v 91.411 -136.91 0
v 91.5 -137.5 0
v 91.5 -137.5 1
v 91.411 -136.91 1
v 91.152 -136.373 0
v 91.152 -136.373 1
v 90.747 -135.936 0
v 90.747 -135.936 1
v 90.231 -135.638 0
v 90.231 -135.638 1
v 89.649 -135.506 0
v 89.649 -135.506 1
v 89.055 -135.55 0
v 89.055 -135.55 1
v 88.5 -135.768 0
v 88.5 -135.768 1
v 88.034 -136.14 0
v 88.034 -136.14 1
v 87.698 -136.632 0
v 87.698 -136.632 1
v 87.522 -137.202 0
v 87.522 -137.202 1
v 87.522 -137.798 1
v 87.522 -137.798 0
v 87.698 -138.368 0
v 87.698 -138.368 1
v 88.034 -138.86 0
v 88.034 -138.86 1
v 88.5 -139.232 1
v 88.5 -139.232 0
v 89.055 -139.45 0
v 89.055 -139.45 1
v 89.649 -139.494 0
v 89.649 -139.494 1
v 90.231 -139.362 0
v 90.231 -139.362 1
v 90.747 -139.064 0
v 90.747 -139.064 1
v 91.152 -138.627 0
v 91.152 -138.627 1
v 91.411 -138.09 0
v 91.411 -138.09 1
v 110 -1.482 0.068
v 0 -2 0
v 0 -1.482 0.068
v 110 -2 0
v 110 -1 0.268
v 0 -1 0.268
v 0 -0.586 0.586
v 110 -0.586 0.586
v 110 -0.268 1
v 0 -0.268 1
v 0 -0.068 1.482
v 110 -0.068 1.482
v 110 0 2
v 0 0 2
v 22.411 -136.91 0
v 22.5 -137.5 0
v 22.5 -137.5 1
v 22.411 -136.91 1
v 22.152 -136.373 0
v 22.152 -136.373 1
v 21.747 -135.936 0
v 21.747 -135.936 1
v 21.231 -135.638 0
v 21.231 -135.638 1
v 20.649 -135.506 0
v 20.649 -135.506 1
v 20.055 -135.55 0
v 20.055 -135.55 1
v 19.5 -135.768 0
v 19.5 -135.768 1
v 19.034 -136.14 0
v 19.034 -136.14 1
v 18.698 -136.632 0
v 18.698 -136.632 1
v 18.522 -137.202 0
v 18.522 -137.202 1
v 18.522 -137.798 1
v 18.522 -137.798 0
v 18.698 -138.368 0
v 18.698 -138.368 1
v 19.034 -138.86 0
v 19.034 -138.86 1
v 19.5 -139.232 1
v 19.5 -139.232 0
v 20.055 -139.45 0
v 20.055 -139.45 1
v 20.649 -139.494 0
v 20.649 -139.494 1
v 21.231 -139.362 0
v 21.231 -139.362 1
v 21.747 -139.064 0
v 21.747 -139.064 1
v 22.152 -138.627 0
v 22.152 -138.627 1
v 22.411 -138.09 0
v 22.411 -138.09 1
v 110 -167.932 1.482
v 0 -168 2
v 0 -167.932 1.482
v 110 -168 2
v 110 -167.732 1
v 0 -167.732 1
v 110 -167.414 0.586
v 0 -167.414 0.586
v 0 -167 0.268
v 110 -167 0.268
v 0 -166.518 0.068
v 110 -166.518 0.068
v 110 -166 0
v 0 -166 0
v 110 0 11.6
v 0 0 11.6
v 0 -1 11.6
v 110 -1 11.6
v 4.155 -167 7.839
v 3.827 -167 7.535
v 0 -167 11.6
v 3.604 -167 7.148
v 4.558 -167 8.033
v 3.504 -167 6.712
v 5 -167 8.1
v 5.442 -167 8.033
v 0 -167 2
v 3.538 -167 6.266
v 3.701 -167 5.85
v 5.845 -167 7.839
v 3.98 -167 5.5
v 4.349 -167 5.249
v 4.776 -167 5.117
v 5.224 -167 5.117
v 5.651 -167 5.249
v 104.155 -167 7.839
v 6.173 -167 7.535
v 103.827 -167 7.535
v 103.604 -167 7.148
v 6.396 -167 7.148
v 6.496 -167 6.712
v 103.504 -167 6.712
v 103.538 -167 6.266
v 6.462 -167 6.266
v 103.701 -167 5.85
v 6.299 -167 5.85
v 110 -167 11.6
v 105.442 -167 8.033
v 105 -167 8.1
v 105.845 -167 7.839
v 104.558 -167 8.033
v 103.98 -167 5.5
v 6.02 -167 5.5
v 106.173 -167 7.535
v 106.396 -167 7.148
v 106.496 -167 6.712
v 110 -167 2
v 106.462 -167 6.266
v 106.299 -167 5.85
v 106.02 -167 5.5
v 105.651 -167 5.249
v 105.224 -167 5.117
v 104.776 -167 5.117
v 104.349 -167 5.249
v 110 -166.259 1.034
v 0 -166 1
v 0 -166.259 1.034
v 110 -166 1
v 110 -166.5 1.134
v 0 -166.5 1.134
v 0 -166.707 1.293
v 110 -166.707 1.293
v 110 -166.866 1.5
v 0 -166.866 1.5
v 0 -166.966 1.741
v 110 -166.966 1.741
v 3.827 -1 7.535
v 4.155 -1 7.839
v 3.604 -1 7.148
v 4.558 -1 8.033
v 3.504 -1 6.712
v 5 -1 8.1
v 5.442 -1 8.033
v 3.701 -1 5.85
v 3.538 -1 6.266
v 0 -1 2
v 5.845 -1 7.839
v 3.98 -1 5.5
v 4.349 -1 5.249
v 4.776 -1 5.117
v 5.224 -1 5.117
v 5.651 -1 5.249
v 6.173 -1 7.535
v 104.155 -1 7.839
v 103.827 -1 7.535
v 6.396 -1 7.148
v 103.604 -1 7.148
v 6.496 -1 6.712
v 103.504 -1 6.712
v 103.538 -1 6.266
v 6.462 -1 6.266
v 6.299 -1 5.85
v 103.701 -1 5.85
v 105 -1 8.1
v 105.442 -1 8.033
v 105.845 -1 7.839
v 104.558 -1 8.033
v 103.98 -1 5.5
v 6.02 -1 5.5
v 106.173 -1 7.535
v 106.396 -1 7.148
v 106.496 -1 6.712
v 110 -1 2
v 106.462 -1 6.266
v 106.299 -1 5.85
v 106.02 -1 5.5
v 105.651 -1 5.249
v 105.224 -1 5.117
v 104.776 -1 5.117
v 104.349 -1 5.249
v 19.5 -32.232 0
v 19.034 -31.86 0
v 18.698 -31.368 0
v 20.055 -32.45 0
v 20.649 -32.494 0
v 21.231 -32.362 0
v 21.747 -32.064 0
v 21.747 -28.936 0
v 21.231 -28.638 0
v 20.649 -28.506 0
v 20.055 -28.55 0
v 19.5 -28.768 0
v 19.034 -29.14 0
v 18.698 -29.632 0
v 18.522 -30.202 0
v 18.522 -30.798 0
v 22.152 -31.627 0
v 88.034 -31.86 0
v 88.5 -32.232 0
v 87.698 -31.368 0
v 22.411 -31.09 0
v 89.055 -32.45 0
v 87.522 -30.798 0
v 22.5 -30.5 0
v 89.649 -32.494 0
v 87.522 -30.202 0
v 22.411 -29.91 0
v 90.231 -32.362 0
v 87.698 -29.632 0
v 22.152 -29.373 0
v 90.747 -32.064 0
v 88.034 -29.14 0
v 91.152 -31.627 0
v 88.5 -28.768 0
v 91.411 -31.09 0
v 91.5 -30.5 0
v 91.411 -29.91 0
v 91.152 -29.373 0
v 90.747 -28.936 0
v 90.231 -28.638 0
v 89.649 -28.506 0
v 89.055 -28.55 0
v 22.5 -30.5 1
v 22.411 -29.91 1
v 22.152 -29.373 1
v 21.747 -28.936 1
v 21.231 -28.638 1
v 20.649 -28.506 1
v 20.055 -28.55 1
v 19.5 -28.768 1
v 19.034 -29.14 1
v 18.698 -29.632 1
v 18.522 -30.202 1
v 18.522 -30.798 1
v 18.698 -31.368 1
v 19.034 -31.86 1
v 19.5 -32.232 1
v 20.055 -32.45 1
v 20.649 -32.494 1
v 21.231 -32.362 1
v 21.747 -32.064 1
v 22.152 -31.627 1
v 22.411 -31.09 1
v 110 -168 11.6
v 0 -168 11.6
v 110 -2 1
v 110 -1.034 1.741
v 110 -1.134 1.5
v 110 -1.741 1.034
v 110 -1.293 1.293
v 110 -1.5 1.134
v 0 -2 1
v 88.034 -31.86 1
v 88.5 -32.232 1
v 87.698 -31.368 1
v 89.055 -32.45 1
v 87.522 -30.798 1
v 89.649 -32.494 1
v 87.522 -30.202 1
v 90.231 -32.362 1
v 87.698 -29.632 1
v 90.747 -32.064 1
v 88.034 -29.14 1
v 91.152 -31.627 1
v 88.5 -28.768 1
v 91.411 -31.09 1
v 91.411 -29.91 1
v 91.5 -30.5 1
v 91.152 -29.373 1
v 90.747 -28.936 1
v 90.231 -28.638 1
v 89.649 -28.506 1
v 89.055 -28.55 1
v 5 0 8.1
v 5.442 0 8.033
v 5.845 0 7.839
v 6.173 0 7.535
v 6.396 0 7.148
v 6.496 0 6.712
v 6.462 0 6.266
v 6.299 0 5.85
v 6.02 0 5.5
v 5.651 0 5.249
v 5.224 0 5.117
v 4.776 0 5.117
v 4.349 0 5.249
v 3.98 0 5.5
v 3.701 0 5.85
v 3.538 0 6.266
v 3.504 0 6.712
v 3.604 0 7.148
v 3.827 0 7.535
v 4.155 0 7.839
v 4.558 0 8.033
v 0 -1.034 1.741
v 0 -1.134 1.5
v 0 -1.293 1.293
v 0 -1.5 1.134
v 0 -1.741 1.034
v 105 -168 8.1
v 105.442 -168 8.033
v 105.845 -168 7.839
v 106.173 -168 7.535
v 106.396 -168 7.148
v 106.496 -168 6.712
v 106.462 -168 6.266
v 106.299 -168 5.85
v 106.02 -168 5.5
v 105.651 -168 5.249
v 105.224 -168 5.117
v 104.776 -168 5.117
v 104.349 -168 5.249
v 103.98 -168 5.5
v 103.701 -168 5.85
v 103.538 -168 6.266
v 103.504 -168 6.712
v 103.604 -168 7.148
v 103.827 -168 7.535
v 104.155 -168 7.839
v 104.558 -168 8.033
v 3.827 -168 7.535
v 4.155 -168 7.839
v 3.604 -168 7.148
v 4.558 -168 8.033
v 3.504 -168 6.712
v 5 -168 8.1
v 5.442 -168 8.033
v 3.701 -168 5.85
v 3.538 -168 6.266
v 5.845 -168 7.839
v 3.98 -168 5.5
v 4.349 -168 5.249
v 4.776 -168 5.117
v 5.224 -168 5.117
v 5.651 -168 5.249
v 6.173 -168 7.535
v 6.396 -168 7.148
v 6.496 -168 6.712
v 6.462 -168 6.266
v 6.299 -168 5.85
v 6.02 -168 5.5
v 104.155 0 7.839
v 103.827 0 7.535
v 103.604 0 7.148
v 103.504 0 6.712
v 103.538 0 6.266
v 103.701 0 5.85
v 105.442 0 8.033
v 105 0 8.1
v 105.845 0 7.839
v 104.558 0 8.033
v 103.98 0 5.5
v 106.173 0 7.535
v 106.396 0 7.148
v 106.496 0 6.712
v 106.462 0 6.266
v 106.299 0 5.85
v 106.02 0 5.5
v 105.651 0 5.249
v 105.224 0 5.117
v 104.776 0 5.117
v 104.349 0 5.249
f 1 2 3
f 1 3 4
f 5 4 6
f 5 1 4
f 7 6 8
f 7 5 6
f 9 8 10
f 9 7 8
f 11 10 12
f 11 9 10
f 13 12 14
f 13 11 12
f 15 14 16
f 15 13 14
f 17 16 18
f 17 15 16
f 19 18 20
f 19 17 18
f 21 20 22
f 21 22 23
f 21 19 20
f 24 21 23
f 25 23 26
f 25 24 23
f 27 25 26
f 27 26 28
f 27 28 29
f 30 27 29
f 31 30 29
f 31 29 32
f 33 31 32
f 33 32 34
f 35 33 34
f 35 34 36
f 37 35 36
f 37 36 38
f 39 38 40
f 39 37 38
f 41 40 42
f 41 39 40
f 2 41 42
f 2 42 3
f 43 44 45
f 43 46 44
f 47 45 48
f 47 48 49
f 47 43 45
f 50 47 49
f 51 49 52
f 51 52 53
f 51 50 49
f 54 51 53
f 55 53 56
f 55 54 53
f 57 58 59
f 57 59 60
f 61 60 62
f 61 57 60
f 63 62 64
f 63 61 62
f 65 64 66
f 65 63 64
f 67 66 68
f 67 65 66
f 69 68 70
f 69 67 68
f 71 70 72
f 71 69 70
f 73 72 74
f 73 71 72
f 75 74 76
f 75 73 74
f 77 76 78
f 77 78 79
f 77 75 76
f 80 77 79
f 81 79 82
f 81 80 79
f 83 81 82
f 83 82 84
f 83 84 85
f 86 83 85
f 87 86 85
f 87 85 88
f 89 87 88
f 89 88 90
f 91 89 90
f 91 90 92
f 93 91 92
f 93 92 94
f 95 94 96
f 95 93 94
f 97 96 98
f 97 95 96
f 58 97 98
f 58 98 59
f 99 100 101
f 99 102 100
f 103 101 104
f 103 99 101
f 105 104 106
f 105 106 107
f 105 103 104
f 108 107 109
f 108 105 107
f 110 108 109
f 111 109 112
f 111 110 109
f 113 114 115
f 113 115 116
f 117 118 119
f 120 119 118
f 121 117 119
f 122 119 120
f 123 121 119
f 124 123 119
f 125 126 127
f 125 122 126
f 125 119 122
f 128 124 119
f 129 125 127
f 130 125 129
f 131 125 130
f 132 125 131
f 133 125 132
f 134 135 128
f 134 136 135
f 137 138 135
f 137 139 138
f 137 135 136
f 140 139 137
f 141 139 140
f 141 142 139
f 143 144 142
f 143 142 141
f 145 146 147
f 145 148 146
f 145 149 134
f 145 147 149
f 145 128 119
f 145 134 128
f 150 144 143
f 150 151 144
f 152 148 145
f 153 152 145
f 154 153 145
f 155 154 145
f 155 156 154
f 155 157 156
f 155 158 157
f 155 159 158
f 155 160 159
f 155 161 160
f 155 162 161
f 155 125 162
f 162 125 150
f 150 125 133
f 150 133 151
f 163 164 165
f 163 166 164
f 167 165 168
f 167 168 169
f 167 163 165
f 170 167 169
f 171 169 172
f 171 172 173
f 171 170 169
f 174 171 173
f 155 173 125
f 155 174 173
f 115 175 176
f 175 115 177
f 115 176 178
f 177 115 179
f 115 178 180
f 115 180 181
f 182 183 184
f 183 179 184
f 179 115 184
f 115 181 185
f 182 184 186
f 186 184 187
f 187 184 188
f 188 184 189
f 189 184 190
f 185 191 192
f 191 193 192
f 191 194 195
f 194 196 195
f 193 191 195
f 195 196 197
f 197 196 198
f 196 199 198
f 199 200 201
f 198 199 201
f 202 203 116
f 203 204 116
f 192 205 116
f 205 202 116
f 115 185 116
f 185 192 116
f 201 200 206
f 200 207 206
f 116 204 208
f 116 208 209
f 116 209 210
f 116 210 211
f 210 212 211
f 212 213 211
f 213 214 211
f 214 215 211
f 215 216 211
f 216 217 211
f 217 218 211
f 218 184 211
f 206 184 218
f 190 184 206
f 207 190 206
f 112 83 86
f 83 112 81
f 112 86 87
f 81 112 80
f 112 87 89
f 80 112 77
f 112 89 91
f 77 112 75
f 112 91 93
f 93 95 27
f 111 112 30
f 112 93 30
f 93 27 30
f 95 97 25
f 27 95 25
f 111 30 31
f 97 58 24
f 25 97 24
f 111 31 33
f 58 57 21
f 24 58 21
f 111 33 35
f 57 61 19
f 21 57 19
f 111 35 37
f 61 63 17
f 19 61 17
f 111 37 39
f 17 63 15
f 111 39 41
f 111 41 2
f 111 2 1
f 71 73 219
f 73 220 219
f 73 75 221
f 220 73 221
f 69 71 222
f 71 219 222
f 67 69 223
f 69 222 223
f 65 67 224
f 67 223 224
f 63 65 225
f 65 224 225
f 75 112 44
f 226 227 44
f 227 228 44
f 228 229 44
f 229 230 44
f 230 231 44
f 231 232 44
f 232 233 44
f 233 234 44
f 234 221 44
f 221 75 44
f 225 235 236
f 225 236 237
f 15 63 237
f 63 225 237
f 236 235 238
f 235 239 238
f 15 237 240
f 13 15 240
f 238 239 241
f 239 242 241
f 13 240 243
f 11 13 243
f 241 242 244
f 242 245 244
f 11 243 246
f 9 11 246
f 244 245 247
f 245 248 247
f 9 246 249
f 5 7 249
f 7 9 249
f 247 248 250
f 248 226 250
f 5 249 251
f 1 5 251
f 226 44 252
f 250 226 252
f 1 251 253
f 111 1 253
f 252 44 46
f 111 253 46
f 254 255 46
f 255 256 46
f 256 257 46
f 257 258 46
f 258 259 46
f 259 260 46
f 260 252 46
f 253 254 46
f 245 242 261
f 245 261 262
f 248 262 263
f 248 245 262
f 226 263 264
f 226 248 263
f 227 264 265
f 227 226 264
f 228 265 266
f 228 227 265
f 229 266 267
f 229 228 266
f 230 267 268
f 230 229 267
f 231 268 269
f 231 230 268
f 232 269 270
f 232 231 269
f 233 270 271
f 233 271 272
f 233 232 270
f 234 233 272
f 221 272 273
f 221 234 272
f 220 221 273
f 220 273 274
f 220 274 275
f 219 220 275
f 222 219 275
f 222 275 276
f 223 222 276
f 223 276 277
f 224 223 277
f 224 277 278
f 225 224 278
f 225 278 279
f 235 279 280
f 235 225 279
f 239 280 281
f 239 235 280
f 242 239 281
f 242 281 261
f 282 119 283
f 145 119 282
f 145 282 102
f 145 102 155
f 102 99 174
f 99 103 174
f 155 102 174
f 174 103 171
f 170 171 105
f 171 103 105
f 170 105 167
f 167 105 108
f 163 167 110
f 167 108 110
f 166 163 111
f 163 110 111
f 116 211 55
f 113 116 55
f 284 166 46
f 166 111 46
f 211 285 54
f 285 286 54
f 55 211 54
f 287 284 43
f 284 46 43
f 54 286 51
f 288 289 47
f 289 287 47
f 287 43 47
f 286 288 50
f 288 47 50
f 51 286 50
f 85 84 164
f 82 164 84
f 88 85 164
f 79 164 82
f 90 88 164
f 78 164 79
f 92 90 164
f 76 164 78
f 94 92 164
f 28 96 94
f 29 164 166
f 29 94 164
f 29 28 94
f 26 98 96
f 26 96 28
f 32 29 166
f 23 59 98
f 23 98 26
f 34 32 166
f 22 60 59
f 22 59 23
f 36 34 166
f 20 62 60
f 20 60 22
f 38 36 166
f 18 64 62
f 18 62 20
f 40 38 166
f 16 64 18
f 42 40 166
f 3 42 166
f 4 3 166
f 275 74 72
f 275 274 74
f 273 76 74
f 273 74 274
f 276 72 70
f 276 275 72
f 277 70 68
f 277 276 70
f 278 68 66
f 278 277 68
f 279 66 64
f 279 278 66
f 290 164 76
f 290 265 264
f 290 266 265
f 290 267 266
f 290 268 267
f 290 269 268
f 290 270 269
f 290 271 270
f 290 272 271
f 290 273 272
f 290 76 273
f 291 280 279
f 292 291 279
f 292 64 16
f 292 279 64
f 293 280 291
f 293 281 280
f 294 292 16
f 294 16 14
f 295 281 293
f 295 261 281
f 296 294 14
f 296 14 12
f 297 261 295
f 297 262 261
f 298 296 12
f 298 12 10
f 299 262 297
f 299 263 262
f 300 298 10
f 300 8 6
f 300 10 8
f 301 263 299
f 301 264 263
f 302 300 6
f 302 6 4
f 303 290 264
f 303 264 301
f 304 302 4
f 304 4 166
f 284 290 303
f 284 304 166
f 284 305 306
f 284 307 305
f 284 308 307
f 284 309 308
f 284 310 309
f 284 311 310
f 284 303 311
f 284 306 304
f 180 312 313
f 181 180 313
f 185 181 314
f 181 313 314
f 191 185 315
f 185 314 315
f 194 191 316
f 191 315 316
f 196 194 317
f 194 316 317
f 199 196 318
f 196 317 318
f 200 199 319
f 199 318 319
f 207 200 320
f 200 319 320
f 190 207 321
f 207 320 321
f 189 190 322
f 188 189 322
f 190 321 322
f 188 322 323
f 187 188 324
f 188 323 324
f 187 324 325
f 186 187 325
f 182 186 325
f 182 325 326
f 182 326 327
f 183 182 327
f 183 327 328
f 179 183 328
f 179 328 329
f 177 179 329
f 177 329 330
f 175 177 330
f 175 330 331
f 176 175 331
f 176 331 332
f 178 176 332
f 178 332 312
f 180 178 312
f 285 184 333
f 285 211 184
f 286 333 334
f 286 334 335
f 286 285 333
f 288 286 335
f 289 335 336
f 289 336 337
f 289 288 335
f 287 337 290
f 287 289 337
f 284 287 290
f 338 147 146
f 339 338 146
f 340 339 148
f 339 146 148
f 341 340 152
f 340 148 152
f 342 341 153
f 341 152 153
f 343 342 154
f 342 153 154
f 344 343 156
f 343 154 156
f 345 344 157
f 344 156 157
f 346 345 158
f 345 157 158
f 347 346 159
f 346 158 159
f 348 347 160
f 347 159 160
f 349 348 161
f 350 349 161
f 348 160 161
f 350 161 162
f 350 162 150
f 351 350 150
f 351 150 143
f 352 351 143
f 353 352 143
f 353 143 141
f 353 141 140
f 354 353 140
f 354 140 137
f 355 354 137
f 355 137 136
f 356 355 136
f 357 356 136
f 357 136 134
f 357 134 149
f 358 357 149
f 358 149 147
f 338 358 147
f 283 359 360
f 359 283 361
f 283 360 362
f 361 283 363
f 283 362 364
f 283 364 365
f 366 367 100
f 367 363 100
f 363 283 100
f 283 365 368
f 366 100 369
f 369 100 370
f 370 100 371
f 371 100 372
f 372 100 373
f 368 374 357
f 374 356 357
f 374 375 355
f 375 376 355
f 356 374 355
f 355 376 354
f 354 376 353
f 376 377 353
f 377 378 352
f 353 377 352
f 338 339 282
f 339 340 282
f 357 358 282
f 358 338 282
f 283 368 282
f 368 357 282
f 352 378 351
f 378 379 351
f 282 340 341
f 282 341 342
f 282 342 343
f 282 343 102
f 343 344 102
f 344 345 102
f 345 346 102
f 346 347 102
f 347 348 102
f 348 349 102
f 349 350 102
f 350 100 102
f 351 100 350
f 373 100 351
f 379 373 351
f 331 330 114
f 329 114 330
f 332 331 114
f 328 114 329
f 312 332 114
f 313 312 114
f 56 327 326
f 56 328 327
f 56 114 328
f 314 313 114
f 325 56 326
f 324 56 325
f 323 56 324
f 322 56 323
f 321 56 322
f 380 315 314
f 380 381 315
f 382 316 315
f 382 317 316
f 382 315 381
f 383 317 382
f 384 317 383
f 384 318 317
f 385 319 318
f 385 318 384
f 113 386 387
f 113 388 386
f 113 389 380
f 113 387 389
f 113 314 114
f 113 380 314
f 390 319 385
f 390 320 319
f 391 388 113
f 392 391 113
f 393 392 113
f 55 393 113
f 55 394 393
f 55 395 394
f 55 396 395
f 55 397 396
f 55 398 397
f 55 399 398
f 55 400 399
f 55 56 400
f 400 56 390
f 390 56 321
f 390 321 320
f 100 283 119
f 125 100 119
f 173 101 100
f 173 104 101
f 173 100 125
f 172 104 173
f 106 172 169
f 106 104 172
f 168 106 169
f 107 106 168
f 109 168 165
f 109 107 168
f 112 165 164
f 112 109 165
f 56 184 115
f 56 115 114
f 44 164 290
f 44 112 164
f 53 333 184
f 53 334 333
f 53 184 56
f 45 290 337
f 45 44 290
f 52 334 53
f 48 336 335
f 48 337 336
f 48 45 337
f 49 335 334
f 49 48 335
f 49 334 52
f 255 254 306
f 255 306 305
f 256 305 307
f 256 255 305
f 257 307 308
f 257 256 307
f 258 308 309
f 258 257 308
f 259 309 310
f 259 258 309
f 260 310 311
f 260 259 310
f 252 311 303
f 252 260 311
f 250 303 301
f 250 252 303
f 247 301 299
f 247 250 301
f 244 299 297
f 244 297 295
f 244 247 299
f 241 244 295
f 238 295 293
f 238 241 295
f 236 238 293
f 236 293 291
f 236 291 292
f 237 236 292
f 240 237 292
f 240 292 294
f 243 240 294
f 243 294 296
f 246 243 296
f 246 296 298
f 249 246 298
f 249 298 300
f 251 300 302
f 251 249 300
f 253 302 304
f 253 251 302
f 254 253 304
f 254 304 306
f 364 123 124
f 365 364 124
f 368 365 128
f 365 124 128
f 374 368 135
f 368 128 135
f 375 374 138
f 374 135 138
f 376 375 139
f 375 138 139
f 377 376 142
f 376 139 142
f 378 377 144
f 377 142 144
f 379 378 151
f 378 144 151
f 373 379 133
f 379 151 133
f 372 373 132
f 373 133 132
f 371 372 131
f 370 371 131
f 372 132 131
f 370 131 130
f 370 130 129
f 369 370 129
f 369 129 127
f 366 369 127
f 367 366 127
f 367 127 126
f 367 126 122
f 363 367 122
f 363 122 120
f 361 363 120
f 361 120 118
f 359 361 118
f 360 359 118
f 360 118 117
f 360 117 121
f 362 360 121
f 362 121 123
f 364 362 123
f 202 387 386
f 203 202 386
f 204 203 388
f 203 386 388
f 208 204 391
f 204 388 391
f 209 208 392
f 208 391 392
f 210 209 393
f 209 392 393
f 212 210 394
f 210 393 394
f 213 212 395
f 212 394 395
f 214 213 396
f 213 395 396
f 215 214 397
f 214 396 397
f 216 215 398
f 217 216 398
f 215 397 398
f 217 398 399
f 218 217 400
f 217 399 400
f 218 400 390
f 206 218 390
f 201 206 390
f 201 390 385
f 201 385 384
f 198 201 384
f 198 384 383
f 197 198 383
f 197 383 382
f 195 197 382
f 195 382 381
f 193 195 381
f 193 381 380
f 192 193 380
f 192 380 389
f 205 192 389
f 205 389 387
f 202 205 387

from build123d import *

# Parameters (mm, degrees)
ESQUISSE1_W             = 110
ESQUISSE1_H             = 168
ESQUISSE1_R             = 2
BOSS_EXTRU_1_DEPTH      = 1
ESQUISSE2_W             = 110
ESQUISSE2_H             = 1
BOSS_EXTRU_2_DEPTH      = 10.6
CONG_1_R                = 2
CONG_2_R                = 1
ESQUISSE3_R             = 1.5
ENL_V_MAT_EXTRU_1_DEPTH = 202.143133117


with BuildPart() as part:
    # Esquisse1 → Boss.-Extru.1 (new body)
    with BuildSketch(Plane.XY):
        with Locations((55, -84)):
            Rectangle(ESQUISSE1_W, ESQUISSE1_H)
        with Locations((20.5, -30.5)):
            Circle(ESQUISSE1_R, mode=Mode.SUBTRACT)
        with Locations((89.5, -30.5)):
            Circle(ESQUISSE1_R, mode=Mode.SUBTRACT)
        with Locations((89.5, -137.5)):
            Circle(ESQUISSE1_R, mode=Mode.SUBTRACT)
        with Locations((20.5, -137.5)):
            Circle(ESQUISSE1_R, mode=Mode.SUBTRACT)
    extrude(amount=BOSS_EXTRU_1_DEPTH)

    # Esquisse2 → Boss.-Extru.2 (add)
    with BuildSketch(Plane.XY.offset(1)):
        with Locations((55, -167.5)):
            Rectangle(ESQUISSE2_W, ESQUISSE2_H)
        with Locations((55, -0.5)):
            Rectangle(ESQUISSE2_W, ESQUISSE2_H)
    extrude(amount=BOSS_EXTRU_2_DEPTH)

    # Congé1
    cong_1_edges = [part.edges().sort_by_distance(p)[0] for p in [
        (55, 0, 0),
        (55, -168, 0),
    ]]
    fillet(cong_1_edges, radius=CONG_1_R)

    # Congé2
    cong_2_edges = [part.edges().sort_by_distance(p)[0] for p in [
        (55, -167, 1),
        (55, -1, 1),
    ]]
    fillet(cong_2_edges, radius=CONG_2_R)

    # Esquisse3 → Enlèv. mat.-Extru.1 (cut, through all)
    with BuildSketch(Plane(origin=(0, 0, 0), x_dir=(1, 0, 0), z_dir=(0, 1, 0))):
        with Locations(Location((105, -6.6, 0), (0, 0, 270))):
            Circle(ESQUISSE3_R)
        with Locations(Location((5, -6.6, 0), (0, 0, 270))):
            Circle(ESQUISSE3_R)
    extrude(amount=-ENL_V_MAT_EXTRU_1_DEPTH, mode=Mode.SUBTRACT)


solid = part.part
